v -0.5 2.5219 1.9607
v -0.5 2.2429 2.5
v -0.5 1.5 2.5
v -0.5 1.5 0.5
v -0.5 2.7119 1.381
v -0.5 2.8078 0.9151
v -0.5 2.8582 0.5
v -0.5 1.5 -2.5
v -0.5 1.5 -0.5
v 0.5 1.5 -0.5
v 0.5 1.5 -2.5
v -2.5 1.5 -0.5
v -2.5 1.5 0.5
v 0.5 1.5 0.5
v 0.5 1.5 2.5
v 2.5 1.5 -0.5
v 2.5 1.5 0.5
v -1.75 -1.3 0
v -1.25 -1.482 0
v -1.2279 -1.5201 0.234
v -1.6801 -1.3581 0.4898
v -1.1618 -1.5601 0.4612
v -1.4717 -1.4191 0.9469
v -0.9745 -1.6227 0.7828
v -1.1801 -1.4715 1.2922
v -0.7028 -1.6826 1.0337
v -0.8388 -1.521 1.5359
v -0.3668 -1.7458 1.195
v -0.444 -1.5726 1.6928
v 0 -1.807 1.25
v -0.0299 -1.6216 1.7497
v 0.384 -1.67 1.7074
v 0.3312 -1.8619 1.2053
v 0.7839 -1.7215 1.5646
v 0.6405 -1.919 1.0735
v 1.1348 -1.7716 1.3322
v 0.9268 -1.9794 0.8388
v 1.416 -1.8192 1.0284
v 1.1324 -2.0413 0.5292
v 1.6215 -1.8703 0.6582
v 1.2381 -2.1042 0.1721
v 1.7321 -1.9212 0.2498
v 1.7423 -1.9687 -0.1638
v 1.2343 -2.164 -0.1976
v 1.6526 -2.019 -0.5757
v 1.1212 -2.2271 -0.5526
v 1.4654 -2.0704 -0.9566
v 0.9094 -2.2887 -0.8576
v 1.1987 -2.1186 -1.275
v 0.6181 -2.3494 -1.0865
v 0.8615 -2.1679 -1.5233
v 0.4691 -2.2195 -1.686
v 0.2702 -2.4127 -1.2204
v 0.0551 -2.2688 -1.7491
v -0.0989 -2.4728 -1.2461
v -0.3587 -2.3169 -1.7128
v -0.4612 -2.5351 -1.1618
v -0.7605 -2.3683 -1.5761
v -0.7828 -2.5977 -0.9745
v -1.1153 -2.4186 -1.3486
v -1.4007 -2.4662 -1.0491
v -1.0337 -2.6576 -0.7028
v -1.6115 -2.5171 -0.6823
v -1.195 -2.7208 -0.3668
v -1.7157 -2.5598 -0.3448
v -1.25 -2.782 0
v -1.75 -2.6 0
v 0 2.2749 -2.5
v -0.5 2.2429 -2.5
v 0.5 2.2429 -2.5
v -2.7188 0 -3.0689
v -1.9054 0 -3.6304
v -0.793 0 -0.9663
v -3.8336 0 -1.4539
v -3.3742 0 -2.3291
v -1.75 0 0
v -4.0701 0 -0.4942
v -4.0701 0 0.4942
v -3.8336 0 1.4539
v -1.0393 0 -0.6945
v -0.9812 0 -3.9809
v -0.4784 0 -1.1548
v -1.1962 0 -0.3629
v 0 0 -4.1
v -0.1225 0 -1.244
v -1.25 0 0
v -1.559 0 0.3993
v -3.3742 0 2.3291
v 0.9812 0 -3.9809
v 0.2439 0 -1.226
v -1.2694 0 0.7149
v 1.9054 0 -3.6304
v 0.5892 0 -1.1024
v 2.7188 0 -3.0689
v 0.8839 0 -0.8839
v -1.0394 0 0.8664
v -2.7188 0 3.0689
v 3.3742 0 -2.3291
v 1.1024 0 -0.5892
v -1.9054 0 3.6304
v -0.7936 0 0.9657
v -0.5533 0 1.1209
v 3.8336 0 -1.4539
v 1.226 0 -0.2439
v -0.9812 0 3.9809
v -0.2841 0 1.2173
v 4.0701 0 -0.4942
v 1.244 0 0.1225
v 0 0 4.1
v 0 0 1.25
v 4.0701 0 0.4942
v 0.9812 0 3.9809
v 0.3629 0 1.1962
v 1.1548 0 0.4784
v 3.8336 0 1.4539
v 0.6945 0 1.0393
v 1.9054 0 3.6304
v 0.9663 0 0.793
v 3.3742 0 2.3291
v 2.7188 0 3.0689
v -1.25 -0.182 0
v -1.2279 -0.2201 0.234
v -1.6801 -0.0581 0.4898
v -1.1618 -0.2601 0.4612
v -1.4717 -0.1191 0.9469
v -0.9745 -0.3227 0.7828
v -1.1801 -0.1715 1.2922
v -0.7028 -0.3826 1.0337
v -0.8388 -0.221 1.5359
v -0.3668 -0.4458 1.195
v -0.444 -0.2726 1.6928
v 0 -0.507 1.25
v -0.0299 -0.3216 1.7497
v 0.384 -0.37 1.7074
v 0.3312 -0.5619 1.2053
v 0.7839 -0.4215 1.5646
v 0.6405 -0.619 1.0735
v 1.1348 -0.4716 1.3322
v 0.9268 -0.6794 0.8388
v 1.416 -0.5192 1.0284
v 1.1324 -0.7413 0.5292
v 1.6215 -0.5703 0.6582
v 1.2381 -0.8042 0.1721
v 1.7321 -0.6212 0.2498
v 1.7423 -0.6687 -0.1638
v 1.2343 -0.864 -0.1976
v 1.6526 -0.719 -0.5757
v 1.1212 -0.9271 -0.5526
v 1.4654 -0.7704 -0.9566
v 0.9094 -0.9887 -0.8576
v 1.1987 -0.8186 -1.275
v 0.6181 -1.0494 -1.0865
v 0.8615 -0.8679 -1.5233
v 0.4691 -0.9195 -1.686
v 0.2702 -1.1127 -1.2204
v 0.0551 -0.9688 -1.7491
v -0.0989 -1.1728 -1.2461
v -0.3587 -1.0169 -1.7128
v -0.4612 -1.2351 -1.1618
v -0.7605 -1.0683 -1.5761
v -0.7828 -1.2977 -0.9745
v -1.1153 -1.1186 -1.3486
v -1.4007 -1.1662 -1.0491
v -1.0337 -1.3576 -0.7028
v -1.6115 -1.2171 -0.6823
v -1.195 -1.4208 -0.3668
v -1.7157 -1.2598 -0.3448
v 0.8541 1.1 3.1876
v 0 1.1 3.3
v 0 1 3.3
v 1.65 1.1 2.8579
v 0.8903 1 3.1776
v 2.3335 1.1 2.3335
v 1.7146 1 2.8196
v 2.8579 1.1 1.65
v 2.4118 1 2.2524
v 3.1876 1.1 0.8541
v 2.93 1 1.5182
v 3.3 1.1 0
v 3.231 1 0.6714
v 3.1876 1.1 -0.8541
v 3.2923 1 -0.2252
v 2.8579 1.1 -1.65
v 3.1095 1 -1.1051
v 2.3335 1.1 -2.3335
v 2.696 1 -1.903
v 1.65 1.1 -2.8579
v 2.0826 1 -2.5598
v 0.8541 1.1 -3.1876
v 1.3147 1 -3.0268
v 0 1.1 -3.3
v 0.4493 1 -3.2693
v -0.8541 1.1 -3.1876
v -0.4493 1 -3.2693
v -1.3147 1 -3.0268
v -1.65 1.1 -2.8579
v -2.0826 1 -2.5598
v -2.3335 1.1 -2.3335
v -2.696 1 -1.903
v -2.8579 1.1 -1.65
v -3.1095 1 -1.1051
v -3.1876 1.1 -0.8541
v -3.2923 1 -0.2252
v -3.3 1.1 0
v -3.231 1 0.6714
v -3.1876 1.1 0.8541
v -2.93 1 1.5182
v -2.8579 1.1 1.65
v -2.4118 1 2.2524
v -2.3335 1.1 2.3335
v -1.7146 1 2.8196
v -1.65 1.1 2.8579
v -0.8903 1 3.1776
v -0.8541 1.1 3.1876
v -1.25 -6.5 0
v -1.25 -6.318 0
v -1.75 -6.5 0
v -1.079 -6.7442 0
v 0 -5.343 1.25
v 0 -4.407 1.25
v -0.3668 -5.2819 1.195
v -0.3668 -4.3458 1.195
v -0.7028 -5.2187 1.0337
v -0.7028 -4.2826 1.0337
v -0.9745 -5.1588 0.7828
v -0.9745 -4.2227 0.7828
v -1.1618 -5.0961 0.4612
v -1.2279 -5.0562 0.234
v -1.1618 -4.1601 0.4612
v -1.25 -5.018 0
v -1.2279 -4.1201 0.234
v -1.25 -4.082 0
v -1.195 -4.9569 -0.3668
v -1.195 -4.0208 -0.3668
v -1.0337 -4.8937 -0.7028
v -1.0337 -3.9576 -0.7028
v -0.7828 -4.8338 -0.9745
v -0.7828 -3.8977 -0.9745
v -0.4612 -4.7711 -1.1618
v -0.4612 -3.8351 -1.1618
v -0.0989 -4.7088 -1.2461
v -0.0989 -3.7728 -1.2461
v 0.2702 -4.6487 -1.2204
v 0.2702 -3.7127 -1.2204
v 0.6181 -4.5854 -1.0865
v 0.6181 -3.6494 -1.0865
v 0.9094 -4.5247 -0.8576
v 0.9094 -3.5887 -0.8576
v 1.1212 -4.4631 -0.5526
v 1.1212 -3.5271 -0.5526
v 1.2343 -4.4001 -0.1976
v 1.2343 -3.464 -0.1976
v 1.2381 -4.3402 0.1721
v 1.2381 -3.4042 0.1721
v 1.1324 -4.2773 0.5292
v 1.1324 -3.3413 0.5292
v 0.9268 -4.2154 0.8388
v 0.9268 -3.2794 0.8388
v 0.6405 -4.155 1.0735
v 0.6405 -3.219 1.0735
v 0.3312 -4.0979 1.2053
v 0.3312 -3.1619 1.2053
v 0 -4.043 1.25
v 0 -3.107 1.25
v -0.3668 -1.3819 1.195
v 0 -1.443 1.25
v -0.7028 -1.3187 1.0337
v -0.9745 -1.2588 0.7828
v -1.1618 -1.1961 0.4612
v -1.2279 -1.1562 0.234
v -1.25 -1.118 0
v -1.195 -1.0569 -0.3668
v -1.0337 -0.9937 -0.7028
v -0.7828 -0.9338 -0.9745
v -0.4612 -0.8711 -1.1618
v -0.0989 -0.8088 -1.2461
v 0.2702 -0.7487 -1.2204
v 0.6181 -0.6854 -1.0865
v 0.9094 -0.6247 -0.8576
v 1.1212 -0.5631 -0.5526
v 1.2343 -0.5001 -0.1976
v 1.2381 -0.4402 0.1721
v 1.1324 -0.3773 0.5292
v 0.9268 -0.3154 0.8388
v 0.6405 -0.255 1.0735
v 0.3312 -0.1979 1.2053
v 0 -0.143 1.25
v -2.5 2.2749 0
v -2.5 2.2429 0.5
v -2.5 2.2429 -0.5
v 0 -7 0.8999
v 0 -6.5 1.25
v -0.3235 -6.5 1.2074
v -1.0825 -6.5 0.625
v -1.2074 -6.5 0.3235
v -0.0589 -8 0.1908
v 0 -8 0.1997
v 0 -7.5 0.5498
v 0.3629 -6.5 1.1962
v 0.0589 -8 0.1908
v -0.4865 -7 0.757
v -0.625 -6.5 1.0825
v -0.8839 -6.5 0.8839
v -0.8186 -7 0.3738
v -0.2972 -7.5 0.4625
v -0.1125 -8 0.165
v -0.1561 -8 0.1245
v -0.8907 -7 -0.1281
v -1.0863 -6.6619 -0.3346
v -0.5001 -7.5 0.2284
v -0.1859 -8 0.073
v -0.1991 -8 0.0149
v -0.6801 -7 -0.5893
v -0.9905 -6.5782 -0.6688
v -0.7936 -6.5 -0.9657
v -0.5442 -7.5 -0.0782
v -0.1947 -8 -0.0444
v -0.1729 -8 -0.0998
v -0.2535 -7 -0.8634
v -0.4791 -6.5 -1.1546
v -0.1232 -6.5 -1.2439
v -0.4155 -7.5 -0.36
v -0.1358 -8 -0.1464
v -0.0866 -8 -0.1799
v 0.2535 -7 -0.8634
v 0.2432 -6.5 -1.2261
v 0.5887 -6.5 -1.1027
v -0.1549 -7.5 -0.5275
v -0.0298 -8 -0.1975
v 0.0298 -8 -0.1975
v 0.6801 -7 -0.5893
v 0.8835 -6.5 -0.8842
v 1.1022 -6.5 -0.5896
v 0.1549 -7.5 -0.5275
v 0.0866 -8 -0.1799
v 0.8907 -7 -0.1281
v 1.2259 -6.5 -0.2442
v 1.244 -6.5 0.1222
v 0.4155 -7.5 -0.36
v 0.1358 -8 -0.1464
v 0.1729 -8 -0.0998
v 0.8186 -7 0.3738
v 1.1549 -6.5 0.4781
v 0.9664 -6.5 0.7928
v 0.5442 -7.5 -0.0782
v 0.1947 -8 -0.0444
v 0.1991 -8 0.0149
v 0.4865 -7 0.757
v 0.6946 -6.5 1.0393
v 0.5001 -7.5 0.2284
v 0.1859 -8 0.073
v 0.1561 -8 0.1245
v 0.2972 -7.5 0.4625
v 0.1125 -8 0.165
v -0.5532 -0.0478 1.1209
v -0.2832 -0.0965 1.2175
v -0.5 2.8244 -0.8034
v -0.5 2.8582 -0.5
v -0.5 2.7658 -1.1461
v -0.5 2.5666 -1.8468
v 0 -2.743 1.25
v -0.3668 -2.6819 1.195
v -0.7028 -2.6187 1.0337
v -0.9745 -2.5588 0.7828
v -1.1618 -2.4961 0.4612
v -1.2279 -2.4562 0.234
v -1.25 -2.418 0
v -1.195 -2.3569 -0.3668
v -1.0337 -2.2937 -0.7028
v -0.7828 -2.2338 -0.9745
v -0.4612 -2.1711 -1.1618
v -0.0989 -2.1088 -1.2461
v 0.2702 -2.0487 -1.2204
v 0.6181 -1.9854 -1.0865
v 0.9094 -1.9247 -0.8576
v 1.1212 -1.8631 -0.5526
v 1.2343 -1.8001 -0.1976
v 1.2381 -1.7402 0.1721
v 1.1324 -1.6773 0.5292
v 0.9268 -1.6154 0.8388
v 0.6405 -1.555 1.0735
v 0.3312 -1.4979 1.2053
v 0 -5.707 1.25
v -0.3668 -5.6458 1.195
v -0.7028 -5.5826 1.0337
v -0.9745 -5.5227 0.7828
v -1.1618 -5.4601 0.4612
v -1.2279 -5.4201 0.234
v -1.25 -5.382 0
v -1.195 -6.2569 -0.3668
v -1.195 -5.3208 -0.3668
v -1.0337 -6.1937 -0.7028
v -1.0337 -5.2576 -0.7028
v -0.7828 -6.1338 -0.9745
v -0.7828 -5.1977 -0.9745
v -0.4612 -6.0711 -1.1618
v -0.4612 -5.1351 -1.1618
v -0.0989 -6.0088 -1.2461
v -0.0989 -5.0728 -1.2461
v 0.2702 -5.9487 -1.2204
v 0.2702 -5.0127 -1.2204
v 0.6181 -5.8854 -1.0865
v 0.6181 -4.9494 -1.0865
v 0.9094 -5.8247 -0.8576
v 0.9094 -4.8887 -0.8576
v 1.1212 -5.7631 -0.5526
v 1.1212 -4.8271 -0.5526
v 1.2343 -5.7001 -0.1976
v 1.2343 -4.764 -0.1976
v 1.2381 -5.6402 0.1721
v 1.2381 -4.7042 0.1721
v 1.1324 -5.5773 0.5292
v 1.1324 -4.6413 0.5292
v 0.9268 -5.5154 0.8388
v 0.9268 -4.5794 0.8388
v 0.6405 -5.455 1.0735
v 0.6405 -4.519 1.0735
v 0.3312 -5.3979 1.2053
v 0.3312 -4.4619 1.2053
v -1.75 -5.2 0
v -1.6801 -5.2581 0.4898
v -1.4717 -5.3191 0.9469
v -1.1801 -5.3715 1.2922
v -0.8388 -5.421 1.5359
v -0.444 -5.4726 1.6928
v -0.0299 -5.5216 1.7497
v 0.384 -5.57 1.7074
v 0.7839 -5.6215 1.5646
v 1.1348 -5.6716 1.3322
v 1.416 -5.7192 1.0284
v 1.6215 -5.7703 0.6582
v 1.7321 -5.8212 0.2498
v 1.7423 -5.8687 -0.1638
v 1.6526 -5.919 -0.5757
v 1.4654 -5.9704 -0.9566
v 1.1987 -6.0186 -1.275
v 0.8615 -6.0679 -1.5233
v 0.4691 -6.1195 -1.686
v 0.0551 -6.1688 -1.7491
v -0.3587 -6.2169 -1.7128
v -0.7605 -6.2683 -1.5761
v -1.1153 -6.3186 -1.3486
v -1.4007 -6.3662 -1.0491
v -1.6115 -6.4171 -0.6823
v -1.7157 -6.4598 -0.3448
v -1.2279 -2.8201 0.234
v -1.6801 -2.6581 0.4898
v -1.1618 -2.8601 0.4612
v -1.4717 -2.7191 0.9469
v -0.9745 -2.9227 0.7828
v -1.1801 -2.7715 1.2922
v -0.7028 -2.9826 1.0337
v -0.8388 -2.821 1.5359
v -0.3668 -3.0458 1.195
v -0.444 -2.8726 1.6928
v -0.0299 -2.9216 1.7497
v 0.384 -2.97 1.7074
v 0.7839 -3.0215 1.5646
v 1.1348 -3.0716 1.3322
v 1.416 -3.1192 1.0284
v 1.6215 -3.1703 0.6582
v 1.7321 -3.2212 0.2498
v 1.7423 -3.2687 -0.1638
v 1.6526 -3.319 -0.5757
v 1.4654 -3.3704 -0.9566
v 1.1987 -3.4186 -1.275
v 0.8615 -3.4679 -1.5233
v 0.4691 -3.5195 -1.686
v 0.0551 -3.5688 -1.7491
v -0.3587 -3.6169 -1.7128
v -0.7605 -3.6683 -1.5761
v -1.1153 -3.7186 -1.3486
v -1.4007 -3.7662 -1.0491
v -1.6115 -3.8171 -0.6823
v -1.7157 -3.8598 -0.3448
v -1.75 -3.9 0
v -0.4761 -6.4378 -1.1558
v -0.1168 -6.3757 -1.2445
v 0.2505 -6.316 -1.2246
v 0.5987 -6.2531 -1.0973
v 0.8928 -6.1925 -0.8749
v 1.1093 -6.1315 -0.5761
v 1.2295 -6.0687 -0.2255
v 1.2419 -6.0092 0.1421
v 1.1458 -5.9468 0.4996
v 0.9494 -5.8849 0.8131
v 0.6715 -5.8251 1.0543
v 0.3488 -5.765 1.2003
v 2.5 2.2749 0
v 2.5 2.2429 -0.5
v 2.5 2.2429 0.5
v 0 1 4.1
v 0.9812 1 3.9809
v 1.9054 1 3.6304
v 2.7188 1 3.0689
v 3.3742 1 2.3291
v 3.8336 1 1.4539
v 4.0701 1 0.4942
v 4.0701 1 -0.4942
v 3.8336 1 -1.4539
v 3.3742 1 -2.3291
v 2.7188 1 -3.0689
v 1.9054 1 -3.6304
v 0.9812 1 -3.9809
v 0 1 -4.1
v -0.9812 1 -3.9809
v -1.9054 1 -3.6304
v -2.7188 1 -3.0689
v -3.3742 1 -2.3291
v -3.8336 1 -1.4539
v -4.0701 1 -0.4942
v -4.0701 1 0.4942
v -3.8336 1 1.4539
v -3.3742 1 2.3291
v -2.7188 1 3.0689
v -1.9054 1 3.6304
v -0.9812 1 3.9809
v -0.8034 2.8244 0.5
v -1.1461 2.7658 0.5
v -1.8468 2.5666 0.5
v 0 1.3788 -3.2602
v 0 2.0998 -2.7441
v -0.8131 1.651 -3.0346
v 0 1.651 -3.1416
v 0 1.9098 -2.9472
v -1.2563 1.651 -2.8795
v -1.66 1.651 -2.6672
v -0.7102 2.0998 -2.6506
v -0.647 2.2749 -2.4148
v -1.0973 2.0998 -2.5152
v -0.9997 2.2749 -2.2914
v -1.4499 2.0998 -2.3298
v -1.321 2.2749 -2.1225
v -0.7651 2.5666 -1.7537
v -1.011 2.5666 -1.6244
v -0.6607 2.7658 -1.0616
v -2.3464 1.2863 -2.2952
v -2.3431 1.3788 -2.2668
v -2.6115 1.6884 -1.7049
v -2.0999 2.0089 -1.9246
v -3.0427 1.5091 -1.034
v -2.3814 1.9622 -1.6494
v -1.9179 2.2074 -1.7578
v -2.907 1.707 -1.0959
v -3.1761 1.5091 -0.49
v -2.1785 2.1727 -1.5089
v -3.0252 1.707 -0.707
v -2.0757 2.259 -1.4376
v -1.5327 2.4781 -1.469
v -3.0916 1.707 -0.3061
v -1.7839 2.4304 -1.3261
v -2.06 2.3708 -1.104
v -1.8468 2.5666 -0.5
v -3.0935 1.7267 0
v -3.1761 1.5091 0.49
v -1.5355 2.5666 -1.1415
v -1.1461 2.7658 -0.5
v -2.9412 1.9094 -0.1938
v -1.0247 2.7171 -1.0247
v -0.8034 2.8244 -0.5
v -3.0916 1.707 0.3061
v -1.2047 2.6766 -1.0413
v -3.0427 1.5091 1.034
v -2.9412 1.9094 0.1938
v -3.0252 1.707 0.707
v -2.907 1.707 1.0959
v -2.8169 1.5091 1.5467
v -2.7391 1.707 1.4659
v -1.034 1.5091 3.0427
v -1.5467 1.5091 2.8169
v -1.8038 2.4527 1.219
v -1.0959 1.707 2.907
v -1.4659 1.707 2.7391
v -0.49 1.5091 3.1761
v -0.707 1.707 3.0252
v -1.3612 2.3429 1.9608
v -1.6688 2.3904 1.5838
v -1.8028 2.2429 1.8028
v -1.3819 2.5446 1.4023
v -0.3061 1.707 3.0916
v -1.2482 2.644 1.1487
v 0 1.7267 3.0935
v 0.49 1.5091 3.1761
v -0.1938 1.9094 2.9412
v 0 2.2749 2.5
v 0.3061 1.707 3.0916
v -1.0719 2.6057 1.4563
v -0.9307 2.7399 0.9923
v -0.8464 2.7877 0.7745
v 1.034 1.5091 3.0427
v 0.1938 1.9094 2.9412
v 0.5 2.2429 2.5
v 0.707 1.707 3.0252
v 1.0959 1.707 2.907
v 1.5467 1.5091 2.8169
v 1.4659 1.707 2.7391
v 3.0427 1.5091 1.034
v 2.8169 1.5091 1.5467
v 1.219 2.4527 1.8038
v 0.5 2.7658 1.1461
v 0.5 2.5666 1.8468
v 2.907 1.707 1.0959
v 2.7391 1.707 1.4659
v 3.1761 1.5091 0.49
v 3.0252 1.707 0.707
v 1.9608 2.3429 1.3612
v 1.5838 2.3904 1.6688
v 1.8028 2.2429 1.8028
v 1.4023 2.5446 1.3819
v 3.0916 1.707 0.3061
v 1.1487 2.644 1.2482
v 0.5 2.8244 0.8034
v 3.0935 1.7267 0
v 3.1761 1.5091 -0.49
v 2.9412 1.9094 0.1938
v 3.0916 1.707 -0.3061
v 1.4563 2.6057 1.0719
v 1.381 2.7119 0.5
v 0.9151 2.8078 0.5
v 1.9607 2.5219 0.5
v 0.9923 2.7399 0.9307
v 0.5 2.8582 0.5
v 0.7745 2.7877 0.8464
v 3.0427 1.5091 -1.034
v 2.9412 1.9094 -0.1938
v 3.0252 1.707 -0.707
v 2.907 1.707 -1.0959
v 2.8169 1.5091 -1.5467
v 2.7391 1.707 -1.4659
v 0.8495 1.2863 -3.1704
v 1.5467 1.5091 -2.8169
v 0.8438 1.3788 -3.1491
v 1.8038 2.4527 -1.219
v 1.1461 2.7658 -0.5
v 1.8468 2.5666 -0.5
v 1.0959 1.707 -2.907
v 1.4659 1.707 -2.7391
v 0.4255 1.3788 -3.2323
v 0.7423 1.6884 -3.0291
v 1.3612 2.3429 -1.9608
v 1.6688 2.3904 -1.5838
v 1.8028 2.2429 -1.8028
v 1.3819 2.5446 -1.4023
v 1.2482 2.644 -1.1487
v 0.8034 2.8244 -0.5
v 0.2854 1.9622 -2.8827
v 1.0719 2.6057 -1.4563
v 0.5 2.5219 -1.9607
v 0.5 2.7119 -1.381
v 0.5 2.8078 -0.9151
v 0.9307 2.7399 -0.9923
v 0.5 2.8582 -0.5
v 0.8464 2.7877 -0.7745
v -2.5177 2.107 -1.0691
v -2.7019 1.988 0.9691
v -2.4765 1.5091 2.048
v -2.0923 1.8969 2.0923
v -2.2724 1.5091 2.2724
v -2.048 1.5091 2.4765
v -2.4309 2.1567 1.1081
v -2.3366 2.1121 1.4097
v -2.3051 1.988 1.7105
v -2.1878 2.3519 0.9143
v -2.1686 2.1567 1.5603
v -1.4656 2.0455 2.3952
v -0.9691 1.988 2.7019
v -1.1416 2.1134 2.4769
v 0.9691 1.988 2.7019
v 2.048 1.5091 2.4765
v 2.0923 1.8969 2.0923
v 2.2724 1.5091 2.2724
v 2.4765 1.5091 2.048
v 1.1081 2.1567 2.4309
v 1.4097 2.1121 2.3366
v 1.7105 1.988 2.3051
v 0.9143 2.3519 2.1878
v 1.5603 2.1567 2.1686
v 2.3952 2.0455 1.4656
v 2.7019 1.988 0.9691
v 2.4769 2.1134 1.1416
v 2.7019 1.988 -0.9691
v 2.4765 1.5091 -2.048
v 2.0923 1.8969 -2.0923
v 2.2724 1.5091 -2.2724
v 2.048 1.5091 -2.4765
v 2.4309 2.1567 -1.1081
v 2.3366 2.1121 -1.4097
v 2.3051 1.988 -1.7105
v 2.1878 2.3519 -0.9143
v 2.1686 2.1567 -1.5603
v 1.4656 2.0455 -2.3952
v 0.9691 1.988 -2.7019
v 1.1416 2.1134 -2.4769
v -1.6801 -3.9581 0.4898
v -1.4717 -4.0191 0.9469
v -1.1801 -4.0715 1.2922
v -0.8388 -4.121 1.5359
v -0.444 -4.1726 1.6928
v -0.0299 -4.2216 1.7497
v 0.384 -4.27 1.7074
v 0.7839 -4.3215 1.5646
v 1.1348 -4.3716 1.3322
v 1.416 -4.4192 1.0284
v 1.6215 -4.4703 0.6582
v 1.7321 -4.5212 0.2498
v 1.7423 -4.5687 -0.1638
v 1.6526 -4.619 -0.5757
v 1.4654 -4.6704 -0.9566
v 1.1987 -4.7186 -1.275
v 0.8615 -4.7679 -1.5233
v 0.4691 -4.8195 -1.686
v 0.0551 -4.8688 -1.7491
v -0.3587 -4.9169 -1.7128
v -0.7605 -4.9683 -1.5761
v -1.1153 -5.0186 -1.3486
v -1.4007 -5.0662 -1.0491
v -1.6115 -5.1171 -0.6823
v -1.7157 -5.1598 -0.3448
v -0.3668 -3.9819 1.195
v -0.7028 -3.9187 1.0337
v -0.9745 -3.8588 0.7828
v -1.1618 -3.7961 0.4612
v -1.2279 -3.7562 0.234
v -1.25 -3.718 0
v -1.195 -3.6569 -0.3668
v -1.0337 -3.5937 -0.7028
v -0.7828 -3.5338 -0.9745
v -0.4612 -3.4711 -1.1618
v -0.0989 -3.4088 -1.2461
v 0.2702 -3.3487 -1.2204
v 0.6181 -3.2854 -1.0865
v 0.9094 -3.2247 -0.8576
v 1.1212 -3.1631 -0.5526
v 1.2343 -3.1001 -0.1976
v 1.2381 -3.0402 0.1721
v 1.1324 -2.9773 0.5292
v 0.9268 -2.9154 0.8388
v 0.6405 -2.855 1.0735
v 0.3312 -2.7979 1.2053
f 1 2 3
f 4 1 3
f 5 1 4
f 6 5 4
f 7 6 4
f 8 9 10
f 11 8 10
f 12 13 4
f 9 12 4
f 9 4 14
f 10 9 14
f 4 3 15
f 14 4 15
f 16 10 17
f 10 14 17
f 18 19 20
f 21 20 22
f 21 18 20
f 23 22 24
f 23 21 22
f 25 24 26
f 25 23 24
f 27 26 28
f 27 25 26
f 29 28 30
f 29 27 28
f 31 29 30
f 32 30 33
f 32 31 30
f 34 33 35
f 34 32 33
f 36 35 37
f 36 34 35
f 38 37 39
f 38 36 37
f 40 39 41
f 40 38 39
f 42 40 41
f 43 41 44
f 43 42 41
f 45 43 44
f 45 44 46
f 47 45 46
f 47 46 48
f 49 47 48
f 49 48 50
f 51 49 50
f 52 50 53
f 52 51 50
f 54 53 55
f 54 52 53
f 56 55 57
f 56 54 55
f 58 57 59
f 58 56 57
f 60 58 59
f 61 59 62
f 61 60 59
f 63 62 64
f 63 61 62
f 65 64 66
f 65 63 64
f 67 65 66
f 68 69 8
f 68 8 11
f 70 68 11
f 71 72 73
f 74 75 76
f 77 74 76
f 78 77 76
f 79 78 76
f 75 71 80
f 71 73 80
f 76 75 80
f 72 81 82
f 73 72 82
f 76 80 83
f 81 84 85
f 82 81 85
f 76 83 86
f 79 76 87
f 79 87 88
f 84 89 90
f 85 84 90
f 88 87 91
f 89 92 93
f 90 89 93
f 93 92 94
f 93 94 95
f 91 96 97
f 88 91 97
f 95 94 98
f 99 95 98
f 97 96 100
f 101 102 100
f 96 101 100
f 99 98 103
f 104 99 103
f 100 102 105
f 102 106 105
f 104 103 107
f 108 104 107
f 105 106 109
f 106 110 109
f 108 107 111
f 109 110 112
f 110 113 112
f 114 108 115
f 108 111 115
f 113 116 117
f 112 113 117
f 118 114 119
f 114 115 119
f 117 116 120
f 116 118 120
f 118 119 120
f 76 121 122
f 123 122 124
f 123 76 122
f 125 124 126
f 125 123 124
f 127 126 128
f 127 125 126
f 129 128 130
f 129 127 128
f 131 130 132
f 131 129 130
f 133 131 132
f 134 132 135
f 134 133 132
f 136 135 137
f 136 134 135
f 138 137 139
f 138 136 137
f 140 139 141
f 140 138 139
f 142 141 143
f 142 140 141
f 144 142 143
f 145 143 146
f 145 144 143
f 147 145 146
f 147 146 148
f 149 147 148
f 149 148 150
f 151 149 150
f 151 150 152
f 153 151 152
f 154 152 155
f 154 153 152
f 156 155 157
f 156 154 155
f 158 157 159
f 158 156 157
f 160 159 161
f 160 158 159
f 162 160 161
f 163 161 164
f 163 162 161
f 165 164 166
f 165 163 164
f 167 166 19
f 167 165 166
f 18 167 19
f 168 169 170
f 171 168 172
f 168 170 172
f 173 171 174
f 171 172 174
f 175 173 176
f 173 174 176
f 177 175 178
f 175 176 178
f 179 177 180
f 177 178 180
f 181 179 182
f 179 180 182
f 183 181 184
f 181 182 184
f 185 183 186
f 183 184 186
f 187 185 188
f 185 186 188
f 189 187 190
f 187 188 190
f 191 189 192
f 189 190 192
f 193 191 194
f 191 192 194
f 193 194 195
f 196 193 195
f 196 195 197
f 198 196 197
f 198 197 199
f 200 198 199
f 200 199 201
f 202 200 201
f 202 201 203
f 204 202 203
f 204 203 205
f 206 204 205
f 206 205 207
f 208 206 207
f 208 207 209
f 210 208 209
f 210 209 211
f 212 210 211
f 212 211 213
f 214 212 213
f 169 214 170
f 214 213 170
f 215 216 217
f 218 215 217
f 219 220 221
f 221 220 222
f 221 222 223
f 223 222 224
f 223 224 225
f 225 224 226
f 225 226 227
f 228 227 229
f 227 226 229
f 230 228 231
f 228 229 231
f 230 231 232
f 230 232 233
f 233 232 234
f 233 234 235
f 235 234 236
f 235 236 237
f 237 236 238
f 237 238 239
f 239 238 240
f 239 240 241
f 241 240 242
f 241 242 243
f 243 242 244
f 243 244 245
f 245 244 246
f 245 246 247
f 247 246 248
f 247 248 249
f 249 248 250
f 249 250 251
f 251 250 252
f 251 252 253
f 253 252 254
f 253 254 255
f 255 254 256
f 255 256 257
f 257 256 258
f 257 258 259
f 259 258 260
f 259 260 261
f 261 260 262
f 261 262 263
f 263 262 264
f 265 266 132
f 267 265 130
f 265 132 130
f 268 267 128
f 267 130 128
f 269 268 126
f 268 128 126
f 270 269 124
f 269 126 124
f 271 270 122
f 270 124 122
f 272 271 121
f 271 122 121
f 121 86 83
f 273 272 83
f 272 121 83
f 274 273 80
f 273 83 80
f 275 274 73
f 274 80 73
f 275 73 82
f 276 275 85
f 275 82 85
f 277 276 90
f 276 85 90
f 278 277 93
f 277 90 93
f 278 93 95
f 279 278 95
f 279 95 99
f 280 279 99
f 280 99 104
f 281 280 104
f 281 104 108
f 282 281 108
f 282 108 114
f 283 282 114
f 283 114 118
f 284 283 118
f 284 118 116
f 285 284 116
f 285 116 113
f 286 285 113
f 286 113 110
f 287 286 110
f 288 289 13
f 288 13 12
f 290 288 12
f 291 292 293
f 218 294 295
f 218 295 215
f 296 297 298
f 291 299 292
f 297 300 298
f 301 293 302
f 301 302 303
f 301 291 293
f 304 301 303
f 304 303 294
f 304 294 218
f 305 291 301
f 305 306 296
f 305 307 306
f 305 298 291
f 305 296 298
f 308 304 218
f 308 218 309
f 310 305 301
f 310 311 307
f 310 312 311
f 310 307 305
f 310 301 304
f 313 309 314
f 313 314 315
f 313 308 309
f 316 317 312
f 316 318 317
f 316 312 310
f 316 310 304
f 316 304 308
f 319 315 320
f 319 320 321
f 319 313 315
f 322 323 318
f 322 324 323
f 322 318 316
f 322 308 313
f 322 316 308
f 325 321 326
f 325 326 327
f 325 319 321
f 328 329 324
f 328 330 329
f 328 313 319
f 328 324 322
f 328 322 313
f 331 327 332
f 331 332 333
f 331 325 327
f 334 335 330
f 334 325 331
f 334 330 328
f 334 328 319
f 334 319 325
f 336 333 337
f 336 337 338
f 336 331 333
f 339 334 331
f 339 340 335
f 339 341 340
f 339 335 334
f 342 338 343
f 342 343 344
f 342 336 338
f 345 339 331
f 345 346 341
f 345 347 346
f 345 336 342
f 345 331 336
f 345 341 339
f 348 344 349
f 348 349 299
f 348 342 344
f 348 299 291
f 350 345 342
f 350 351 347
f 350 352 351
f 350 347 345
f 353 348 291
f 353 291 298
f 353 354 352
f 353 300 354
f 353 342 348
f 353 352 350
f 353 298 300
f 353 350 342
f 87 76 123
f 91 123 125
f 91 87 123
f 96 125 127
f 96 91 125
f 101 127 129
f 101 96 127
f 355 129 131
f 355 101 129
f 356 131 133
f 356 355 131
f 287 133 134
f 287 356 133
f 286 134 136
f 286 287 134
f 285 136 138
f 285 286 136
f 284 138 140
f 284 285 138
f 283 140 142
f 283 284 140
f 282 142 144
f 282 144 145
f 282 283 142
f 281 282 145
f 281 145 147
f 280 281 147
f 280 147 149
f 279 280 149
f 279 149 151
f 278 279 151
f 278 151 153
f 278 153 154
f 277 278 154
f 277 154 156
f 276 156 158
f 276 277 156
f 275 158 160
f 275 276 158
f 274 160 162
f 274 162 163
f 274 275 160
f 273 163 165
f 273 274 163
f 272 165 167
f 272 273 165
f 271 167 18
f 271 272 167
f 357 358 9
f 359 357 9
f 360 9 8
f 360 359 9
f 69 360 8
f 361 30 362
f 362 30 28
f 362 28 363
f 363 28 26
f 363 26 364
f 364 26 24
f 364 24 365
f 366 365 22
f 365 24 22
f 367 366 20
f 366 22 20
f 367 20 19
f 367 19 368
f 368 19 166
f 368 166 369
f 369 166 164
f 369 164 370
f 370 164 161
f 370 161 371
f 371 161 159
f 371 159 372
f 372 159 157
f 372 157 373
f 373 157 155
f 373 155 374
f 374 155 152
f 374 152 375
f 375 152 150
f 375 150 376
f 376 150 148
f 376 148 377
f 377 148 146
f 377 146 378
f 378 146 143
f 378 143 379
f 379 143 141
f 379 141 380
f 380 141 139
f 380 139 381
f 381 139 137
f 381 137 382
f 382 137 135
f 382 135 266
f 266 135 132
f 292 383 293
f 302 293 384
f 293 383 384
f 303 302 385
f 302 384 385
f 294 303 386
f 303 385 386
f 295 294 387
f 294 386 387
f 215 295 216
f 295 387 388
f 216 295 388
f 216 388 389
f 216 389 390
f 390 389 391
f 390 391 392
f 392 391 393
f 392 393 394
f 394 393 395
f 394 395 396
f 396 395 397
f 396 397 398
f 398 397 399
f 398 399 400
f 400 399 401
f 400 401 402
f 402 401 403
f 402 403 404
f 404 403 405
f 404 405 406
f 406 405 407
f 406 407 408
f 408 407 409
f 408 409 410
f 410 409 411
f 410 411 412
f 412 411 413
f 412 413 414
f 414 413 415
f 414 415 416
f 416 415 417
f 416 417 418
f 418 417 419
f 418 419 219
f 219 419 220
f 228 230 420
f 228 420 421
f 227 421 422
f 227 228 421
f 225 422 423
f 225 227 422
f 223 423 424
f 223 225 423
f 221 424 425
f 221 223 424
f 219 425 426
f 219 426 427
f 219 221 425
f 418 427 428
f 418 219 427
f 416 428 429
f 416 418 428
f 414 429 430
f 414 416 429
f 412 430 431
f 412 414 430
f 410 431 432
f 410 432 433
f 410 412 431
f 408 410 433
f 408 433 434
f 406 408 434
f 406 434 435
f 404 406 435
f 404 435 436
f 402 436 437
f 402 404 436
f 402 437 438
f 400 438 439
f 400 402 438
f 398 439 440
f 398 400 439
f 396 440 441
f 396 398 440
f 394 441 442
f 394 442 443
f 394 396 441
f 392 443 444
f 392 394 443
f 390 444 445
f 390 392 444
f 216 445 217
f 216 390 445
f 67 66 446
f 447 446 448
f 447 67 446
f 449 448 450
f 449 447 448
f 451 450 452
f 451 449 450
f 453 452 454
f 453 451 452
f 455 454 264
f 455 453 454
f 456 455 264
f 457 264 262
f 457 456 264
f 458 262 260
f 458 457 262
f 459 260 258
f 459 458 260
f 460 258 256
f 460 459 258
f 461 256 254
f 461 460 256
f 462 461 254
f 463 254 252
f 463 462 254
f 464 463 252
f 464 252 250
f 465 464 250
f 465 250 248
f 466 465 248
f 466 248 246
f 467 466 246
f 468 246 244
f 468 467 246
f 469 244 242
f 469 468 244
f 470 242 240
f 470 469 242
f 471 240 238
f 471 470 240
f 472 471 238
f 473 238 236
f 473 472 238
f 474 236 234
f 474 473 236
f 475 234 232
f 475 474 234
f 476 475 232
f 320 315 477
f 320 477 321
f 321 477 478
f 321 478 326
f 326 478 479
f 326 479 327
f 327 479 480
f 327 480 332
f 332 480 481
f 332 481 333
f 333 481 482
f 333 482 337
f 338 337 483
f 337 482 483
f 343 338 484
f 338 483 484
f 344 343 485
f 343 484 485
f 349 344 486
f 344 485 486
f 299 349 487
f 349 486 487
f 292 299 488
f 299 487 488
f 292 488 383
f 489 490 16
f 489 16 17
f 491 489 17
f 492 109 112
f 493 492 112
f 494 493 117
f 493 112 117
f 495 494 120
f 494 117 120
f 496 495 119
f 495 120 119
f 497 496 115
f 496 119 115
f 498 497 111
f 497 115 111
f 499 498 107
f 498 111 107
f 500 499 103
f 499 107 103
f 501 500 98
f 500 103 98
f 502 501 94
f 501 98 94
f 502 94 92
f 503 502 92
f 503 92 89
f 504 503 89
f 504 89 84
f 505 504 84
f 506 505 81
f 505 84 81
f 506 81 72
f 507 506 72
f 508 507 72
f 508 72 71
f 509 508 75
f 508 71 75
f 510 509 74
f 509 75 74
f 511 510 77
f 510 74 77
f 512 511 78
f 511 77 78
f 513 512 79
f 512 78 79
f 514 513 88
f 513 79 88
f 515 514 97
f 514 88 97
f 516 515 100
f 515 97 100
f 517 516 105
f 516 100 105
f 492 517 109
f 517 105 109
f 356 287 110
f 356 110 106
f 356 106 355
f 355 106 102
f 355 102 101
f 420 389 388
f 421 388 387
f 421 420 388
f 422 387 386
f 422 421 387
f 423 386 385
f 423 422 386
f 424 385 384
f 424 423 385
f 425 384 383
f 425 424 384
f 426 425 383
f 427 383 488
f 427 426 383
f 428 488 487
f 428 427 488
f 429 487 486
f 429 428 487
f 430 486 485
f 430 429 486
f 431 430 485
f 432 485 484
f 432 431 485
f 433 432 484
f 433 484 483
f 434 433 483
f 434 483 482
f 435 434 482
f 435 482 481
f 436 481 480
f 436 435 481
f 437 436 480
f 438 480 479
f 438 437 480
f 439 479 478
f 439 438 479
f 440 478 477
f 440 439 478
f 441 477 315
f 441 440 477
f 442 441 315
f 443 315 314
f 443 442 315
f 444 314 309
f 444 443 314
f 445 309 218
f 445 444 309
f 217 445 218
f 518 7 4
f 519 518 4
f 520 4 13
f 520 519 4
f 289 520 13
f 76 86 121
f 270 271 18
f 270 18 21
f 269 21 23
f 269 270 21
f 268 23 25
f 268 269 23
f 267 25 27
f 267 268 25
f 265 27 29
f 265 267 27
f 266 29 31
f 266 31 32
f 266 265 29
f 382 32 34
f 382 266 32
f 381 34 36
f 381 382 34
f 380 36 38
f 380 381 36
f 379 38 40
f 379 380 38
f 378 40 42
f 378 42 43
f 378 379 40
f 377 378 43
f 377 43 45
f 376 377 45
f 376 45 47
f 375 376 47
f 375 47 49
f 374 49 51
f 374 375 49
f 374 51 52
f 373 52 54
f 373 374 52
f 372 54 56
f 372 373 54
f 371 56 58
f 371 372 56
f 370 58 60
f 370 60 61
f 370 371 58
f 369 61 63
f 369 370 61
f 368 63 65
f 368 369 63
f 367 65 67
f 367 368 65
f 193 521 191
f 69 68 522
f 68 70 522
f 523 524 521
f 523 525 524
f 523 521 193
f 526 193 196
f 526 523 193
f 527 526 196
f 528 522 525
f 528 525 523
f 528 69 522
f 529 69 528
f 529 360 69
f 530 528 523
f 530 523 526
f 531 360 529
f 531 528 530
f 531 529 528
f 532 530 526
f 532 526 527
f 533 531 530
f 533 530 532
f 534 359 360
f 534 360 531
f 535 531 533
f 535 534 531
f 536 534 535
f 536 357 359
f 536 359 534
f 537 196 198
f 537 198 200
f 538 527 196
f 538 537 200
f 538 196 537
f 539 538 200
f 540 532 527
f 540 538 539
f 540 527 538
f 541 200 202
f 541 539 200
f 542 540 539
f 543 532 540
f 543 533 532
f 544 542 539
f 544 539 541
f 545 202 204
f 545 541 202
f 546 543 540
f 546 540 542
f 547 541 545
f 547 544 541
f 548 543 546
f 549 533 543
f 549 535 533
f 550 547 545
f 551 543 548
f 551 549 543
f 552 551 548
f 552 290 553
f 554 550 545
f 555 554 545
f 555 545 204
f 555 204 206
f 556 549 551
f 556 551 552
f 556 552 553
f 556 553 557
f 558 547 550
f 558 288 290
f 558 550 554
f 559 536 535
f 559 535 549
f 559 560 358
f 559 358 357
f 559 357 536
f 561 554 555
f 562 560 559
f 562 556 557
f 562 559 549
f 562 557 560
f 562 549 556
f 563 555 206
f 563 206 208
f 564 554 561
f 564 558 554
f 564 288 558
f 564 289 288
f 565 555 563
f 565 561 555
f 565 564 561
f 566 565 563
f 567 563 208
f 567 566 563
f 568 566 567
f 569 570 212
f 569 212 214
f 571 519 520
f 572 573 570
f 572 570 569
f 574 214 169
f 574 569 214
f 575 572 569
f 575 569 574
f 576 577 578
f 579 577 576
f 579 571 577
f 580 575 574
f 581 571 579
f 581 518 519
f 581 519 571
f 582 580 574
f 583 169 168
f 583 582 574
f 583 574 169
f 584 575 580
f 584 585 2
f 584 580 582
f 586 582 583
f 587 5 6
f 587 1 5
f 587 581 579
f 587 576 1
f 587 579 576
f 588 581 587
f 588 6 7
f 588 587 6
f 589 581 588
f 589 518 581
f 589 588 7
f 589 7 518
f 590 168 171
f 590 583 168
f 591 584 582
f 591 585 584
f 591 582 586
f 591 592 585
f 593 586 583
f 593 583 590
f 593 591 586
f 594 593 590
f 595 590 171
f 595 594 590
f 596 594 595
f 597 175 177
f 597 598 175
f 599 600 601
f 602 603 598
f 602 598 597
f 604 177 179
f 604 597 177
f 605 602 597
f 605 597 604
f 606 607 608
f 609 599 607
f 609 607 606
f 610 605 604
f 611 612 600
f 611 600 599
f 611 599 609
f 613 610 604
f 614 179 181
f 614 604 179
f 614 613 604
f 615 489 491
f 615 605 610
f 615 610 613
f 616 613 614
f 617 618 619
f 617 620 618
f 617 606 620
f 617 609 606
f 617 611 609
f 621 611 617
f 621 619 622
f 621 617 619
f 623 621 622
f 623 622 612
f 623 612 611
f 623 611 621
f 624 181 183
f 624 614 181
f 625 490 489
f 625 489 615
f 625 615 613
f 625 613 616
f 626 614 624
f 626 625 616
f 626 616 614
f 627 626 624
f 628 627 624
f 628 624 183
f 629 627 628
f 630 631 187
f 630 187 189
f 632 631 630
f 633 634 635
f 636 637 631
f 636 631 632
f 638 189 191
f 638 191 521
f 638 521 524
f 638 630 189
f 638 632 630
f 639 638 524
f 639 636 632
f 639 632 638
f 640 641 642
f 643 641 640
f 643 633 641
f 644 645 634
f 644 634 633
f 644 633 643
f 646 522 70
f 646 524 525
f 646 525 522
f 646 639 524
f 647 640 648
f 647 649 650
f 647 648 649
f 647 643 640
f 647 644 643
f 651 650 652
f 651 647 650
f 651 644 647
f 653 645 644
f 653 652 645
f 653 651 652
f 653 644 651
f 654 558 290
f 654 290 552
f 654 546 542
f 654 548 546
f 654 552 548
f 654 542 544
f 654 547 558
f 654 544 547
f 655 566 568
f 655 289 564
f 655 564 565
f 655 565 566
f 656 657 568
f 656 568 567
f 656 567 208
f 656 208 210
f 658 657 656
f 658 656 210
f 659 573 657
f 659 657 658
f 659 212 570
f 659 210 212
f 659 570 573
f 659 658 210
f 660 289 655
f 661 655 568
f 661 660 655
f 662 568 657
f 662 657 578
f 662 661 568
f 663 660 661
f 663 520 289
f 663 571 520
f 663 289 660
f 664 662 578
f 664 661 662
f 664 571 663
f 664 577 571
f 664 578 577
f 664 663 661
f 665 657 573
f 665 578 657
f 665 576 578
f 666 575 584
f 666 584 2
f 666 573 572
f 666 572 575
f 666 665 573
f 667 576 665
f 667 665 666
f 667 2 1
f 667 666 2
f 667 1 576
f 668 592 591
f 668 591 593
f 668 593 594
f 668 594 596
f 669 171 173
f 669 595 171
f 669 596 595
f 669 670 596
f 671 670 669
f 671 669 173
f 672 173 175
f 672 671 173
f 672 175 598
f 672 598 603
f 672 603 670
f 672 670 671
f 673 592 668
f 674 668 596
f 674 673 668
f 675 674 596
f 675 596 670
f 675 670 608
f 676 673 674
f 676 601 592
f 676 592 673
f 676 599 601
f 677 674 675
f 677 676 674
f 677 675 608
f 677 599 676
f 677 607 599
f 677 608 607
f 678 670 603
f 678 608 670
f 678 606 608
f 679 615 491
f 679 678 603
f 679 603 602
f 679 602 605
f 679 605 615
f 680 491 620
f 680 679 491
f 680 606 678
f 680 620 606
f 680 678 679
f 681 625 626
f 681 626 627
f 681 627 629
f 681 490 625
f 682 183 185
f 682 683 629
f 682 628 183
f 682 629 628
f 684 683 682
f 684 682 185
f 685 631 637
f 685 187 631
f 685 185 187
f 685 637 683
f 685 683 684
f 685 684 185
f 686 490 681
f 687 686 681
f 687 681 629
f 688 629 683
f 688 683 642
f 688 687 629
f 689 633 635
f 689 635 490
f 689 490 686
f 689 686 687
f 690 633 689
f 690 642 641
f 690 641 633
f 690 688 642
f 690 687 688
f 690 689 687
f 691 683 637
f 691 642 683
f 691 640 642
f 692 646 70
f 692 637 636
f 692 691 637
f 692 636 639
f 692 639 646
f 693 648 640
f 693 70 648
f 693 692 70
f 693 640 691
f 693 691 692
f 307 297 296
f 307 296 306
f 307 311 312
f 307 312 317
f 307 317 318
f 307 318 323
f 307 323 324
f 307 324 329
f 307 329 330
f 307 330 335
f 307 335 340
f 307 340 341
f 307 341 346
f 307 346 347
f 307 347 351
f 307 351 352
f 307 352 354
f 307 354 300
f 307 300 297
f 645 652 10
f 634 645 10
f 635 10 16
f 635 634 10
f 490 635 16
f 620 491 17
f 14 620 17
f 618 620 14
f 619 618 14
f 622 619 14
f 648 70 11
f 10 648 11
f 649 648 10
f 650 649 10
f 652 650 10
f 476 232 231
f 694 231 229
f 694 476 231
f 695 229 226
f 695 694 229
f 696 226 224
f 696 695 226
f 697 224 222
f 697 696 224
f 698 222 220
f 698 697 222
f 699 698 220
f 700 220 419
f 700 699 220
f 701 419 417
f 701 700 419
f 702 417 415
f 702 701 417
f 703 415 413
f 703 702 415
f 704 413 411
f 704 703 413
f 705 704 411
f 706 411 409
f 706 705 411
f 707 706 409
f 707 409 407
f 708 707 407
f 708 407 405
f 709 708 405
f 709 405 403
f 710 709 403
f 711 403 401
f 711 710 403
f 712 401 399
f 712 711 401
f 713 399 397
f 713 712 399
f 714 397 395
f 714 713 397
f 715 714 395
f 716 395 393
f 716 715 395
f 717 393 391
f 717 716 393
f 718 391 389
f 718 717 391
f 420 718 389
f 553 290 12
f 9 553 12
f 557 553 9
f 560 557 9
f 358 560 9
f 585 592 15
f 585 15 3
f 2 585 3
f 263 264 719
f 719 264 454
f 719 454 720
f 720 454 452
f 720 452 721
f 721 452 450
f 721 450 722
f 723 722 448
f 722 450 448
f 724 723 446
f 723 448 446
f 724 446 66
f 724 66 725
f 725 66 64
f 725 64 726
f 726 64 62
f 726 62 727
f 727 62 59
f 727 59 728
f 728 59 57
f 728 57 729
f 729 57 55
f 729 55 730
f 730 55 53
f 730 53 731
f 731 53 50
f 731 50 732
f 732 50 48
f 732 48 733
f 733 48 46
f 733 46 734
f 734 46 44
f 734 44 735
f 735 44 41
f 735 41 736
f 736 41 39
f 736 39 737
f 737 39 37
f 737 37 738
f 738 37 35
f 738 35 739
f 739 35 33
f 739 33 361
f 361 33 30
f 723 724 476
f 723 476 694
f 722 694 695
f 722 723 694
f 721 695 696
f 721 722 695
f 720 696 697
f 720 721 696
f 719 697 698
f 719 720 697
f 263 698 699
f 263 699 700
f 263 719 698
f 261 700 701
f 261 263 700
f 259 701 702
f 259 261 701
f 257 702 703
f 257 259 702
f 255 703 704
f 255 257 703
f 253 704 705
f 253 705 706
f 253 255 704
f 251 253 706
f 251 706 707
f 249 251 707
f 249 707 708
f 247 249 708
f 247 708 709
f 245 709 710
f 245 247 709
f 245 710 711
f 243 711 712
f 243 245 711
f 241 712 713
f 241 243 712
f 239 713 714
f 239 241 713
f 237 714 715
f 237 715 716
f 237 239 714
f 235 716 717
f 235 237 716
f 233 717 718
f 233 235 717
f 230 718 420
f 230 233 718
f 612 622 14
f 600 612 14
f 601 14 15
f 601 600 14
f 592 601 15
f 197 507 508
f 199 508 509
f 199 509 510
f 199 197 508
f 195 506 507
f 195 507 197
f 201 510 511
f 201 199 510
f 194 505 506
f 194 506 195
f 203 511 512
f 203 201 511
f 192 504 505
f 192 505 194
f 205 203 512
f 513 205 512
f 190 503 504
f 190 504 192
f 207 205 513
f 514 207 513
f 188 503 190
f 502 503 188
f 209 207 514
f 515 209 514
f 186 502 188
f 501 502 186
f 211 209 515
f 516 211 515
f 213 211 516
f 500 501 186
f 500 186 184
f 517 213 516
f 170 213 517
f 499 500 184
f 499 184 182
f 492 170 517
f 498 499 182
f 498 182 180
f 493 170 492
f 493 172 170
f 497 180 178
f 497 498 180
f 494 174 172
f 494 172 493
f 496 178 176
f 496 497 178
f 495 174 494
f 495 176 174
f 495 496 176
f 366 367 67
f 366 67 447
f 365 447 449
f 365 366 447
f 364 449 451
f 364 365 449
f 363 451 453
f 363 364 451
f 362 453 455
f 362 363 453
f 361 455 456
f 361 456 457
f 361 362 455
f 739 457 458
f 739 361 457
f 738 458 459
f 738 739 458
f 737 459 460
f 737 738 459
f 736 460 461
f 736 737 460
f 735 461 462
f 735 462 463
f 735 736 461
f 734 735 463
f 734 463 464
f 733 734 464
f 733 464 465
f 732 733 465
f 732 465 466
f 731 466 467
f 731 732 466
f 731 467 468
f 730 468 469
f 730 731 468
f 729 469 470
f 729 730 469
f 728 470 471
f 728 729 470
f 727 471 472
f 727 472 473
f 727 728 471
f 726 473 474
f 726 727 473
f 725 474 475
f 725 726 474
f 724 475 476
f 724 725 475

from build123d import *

# Parameters (mm, degrees)
SKETCH1_R           = 4.1
BOSS_EXTRUDE1_DEPTH = 1
SKETCH2_R           = 3.3
BOSS_EXTRUDE2_DEPTH = 0.1
DOME1_FACE_RADIUS   = 3.3
DOME1_HEIGHT        = 1.8
CUT_EXTRUDE1_DEPTH  = 3.5
SKETCH4_R           = 1.25
BOSS_EXTRUDE3_DEPTH = 8
CHAMFER1_SIZE       = 1.5
CHAMFER1_SIZE2      = 1.050311307
SWEEP1_PITCH        = 1.3


with BuildPart() as part:
    # Sketch1 → Boss-Extrude1 (new body)
    with BuildSketch(Plane(origin=(0, 0, 0), x_dir=(1, 0, 0), z_dir=(0, 1, 0))):
        with Locations(Location((0, 0, 0), (0, 0, 270))):
            Circle(SKETCH1_R)
    extrude(amount=BOSS_EXTRUDE1_DEPTH)

    # Sketch2 → Boss-Extrude2 (add)
    with BuildSketch(Plane(origin=(0, 1, 0), x_dir=(1, 0, 0), z_dir=(0, 1, 0))):
        with Locations(Location((0, 0, 0), (0, 0, 270))):
            Circle(SKETCH2_R)
    extrude(amount=BOSS_EXTRUDE2_DEPTH)

    # Dome1: an elliptical dome of height H over a round flat face of radius A is half a spheroid: the quarter ellipse of half axes A and H revolved about the face's axis
    with BuildSketch(Plane((0, 1.1, 0), x_dir=(0, 0, -1), z_dir=(1, 0, 0)), mode=Mode.PRIVATE) as dome1_quarter:
        Ellipse(DOME1_FACE_RADIUS, DOME1_HEIGHT)
        Rectangle(DOME1_FACE_RADIUS, DOME1_HEIGHT, align=(Align.MIN, Align.MIN), mode=Mode.INTERSECT)
    revolve(dome1_quarter.sketch, axis=Axis((0, 1.1, 0), (0, 1, 0)))

    # Sketch3 → Cut-Extrude1 (cut)
    with BuildSketch(Plane(origin=(0, 5, 0), x_dir=(-1, 0, 0), z_dir=(0, 1, 0))):
        Polygon((-0.5, 2.5), (0.5, 2.5), (0.5, 0.5), (2.5, 0.5), (2.5, -0.5), (0.5, -0.5), (0.5, -2.5), (-0.5, -2.5), (-0.5, -0.5), (-2.5, -0.5), (-2.5, 0.5), (-0.5, 0.5), align=None)
    extrude(amount=-CUT_EXTRUDE1_DEPTH, mode=Mode.SUBTRACT)

    # Sketch4 → Boss-Extrude3 (add)
    with BuildSketch(Plane.XZ):
        with Locations(Location((0, 0, 0), (0, 0, 90))):
            Circle(SKETCH4_R)
    extrude(amount=BOSS_EXTRUDE3_DEPTH)

    # Chamfer1
    chamfer1_edges = [part.edges().sort_by_distance(p)[0] for p in [
        (0, -8, -1.25),
    ]]
    chamfer1_side = [part.faces().sort_by_distance(p)[0] for p in [
        (0, -4, -1.25),
    ]]
    chamfer(chamfer1_edges, length=CHAMFER1_SIZE, length2=CHAMFER1_SIZE2, reference=chamfer1_side[0])

    # Sweep1: the profile of Sketch6 screwed along a left-hand helix of 5 turns, 8 arcs to a turn; built about Z, then put on its axis
    sweep1_z = Axis((0, 0, 0), (0, 0, 1))
    sweep1_corners = [(1.75, 0, 0), (1.047756447, 0, -0.25559575), (1.047756447, 0, 0.25559575)]
    with BuildLine(mode=Mode.PRIVATE) as sweep1_profile:
        Line(sweep1_corners[0], sweep1_corners[1])
        Line(sweep1_corners[1], sweep1_corners[2])
        Line(sweep1_corners[2], sweep1_corners[0])
    sweep1_cap = Face(sweep1_profile.wire())
    sweep1_turn_angles = [0, -22.5, -45, -67.5, -90, -112.5, -135, -157.5, -180, -202.5, -225, -247.5, -270, -292.5, -315, -337.5, -360]
    sweep1_turn_weights = [1, 0.9238795325112867, 1, 0.9238795325112867, 1, 0.9238795325112867, 1, 0.9238795325112867, 1, 0.9238795325112867, 1, 0.9238795325112867, 1, 0.9238795325112867, 1, 0.9238795325112867, 1]
    sweep1_turn_rails = [Edge.make_bspline([Vector(p[0], p[1], 0).rotate(sweep1_z, sweep1_turn_angles[k]) / sweep1_turn_weights[k] + Vector(0, 0, p[2] + -SWEEP1_PITCH * sweep1_turn_angles[k] / 360) for k in range(17)], [0, 0, 0, 1, 1, 2, 2, 3, 3, 4, 4, 5, 5, 6, 6, 7, 7, 8, 8, 8], 2, sweep1_turn_weights) for p in sweep1_corners]
    sweep1_turn_sides = [Face.make_surface_from_curves(sweep1_turn_rails[p[0]], sweep1_turn_rails[p[1]]) for p in [(0, 1), (1, 2), (2, 0)]]
    sweep1 = Plane(origin=(0, 0, 0), x_dir=(-1, 0, 0), z_dir=(0, -1, 0)) * Solid(Shell([*[p.moved(Location((0, 0, SWEEP1_PITCH * i))) for i in range(5) for p in sweep1_turn_sides], sweep1_cap, sweep1_cap.rotate(sweep1_z, -1800).moved(Location((0, 0, -SWEEP1_PITCH * -1800 / 360)))]))
    add(sweep1)


solid = part.part
